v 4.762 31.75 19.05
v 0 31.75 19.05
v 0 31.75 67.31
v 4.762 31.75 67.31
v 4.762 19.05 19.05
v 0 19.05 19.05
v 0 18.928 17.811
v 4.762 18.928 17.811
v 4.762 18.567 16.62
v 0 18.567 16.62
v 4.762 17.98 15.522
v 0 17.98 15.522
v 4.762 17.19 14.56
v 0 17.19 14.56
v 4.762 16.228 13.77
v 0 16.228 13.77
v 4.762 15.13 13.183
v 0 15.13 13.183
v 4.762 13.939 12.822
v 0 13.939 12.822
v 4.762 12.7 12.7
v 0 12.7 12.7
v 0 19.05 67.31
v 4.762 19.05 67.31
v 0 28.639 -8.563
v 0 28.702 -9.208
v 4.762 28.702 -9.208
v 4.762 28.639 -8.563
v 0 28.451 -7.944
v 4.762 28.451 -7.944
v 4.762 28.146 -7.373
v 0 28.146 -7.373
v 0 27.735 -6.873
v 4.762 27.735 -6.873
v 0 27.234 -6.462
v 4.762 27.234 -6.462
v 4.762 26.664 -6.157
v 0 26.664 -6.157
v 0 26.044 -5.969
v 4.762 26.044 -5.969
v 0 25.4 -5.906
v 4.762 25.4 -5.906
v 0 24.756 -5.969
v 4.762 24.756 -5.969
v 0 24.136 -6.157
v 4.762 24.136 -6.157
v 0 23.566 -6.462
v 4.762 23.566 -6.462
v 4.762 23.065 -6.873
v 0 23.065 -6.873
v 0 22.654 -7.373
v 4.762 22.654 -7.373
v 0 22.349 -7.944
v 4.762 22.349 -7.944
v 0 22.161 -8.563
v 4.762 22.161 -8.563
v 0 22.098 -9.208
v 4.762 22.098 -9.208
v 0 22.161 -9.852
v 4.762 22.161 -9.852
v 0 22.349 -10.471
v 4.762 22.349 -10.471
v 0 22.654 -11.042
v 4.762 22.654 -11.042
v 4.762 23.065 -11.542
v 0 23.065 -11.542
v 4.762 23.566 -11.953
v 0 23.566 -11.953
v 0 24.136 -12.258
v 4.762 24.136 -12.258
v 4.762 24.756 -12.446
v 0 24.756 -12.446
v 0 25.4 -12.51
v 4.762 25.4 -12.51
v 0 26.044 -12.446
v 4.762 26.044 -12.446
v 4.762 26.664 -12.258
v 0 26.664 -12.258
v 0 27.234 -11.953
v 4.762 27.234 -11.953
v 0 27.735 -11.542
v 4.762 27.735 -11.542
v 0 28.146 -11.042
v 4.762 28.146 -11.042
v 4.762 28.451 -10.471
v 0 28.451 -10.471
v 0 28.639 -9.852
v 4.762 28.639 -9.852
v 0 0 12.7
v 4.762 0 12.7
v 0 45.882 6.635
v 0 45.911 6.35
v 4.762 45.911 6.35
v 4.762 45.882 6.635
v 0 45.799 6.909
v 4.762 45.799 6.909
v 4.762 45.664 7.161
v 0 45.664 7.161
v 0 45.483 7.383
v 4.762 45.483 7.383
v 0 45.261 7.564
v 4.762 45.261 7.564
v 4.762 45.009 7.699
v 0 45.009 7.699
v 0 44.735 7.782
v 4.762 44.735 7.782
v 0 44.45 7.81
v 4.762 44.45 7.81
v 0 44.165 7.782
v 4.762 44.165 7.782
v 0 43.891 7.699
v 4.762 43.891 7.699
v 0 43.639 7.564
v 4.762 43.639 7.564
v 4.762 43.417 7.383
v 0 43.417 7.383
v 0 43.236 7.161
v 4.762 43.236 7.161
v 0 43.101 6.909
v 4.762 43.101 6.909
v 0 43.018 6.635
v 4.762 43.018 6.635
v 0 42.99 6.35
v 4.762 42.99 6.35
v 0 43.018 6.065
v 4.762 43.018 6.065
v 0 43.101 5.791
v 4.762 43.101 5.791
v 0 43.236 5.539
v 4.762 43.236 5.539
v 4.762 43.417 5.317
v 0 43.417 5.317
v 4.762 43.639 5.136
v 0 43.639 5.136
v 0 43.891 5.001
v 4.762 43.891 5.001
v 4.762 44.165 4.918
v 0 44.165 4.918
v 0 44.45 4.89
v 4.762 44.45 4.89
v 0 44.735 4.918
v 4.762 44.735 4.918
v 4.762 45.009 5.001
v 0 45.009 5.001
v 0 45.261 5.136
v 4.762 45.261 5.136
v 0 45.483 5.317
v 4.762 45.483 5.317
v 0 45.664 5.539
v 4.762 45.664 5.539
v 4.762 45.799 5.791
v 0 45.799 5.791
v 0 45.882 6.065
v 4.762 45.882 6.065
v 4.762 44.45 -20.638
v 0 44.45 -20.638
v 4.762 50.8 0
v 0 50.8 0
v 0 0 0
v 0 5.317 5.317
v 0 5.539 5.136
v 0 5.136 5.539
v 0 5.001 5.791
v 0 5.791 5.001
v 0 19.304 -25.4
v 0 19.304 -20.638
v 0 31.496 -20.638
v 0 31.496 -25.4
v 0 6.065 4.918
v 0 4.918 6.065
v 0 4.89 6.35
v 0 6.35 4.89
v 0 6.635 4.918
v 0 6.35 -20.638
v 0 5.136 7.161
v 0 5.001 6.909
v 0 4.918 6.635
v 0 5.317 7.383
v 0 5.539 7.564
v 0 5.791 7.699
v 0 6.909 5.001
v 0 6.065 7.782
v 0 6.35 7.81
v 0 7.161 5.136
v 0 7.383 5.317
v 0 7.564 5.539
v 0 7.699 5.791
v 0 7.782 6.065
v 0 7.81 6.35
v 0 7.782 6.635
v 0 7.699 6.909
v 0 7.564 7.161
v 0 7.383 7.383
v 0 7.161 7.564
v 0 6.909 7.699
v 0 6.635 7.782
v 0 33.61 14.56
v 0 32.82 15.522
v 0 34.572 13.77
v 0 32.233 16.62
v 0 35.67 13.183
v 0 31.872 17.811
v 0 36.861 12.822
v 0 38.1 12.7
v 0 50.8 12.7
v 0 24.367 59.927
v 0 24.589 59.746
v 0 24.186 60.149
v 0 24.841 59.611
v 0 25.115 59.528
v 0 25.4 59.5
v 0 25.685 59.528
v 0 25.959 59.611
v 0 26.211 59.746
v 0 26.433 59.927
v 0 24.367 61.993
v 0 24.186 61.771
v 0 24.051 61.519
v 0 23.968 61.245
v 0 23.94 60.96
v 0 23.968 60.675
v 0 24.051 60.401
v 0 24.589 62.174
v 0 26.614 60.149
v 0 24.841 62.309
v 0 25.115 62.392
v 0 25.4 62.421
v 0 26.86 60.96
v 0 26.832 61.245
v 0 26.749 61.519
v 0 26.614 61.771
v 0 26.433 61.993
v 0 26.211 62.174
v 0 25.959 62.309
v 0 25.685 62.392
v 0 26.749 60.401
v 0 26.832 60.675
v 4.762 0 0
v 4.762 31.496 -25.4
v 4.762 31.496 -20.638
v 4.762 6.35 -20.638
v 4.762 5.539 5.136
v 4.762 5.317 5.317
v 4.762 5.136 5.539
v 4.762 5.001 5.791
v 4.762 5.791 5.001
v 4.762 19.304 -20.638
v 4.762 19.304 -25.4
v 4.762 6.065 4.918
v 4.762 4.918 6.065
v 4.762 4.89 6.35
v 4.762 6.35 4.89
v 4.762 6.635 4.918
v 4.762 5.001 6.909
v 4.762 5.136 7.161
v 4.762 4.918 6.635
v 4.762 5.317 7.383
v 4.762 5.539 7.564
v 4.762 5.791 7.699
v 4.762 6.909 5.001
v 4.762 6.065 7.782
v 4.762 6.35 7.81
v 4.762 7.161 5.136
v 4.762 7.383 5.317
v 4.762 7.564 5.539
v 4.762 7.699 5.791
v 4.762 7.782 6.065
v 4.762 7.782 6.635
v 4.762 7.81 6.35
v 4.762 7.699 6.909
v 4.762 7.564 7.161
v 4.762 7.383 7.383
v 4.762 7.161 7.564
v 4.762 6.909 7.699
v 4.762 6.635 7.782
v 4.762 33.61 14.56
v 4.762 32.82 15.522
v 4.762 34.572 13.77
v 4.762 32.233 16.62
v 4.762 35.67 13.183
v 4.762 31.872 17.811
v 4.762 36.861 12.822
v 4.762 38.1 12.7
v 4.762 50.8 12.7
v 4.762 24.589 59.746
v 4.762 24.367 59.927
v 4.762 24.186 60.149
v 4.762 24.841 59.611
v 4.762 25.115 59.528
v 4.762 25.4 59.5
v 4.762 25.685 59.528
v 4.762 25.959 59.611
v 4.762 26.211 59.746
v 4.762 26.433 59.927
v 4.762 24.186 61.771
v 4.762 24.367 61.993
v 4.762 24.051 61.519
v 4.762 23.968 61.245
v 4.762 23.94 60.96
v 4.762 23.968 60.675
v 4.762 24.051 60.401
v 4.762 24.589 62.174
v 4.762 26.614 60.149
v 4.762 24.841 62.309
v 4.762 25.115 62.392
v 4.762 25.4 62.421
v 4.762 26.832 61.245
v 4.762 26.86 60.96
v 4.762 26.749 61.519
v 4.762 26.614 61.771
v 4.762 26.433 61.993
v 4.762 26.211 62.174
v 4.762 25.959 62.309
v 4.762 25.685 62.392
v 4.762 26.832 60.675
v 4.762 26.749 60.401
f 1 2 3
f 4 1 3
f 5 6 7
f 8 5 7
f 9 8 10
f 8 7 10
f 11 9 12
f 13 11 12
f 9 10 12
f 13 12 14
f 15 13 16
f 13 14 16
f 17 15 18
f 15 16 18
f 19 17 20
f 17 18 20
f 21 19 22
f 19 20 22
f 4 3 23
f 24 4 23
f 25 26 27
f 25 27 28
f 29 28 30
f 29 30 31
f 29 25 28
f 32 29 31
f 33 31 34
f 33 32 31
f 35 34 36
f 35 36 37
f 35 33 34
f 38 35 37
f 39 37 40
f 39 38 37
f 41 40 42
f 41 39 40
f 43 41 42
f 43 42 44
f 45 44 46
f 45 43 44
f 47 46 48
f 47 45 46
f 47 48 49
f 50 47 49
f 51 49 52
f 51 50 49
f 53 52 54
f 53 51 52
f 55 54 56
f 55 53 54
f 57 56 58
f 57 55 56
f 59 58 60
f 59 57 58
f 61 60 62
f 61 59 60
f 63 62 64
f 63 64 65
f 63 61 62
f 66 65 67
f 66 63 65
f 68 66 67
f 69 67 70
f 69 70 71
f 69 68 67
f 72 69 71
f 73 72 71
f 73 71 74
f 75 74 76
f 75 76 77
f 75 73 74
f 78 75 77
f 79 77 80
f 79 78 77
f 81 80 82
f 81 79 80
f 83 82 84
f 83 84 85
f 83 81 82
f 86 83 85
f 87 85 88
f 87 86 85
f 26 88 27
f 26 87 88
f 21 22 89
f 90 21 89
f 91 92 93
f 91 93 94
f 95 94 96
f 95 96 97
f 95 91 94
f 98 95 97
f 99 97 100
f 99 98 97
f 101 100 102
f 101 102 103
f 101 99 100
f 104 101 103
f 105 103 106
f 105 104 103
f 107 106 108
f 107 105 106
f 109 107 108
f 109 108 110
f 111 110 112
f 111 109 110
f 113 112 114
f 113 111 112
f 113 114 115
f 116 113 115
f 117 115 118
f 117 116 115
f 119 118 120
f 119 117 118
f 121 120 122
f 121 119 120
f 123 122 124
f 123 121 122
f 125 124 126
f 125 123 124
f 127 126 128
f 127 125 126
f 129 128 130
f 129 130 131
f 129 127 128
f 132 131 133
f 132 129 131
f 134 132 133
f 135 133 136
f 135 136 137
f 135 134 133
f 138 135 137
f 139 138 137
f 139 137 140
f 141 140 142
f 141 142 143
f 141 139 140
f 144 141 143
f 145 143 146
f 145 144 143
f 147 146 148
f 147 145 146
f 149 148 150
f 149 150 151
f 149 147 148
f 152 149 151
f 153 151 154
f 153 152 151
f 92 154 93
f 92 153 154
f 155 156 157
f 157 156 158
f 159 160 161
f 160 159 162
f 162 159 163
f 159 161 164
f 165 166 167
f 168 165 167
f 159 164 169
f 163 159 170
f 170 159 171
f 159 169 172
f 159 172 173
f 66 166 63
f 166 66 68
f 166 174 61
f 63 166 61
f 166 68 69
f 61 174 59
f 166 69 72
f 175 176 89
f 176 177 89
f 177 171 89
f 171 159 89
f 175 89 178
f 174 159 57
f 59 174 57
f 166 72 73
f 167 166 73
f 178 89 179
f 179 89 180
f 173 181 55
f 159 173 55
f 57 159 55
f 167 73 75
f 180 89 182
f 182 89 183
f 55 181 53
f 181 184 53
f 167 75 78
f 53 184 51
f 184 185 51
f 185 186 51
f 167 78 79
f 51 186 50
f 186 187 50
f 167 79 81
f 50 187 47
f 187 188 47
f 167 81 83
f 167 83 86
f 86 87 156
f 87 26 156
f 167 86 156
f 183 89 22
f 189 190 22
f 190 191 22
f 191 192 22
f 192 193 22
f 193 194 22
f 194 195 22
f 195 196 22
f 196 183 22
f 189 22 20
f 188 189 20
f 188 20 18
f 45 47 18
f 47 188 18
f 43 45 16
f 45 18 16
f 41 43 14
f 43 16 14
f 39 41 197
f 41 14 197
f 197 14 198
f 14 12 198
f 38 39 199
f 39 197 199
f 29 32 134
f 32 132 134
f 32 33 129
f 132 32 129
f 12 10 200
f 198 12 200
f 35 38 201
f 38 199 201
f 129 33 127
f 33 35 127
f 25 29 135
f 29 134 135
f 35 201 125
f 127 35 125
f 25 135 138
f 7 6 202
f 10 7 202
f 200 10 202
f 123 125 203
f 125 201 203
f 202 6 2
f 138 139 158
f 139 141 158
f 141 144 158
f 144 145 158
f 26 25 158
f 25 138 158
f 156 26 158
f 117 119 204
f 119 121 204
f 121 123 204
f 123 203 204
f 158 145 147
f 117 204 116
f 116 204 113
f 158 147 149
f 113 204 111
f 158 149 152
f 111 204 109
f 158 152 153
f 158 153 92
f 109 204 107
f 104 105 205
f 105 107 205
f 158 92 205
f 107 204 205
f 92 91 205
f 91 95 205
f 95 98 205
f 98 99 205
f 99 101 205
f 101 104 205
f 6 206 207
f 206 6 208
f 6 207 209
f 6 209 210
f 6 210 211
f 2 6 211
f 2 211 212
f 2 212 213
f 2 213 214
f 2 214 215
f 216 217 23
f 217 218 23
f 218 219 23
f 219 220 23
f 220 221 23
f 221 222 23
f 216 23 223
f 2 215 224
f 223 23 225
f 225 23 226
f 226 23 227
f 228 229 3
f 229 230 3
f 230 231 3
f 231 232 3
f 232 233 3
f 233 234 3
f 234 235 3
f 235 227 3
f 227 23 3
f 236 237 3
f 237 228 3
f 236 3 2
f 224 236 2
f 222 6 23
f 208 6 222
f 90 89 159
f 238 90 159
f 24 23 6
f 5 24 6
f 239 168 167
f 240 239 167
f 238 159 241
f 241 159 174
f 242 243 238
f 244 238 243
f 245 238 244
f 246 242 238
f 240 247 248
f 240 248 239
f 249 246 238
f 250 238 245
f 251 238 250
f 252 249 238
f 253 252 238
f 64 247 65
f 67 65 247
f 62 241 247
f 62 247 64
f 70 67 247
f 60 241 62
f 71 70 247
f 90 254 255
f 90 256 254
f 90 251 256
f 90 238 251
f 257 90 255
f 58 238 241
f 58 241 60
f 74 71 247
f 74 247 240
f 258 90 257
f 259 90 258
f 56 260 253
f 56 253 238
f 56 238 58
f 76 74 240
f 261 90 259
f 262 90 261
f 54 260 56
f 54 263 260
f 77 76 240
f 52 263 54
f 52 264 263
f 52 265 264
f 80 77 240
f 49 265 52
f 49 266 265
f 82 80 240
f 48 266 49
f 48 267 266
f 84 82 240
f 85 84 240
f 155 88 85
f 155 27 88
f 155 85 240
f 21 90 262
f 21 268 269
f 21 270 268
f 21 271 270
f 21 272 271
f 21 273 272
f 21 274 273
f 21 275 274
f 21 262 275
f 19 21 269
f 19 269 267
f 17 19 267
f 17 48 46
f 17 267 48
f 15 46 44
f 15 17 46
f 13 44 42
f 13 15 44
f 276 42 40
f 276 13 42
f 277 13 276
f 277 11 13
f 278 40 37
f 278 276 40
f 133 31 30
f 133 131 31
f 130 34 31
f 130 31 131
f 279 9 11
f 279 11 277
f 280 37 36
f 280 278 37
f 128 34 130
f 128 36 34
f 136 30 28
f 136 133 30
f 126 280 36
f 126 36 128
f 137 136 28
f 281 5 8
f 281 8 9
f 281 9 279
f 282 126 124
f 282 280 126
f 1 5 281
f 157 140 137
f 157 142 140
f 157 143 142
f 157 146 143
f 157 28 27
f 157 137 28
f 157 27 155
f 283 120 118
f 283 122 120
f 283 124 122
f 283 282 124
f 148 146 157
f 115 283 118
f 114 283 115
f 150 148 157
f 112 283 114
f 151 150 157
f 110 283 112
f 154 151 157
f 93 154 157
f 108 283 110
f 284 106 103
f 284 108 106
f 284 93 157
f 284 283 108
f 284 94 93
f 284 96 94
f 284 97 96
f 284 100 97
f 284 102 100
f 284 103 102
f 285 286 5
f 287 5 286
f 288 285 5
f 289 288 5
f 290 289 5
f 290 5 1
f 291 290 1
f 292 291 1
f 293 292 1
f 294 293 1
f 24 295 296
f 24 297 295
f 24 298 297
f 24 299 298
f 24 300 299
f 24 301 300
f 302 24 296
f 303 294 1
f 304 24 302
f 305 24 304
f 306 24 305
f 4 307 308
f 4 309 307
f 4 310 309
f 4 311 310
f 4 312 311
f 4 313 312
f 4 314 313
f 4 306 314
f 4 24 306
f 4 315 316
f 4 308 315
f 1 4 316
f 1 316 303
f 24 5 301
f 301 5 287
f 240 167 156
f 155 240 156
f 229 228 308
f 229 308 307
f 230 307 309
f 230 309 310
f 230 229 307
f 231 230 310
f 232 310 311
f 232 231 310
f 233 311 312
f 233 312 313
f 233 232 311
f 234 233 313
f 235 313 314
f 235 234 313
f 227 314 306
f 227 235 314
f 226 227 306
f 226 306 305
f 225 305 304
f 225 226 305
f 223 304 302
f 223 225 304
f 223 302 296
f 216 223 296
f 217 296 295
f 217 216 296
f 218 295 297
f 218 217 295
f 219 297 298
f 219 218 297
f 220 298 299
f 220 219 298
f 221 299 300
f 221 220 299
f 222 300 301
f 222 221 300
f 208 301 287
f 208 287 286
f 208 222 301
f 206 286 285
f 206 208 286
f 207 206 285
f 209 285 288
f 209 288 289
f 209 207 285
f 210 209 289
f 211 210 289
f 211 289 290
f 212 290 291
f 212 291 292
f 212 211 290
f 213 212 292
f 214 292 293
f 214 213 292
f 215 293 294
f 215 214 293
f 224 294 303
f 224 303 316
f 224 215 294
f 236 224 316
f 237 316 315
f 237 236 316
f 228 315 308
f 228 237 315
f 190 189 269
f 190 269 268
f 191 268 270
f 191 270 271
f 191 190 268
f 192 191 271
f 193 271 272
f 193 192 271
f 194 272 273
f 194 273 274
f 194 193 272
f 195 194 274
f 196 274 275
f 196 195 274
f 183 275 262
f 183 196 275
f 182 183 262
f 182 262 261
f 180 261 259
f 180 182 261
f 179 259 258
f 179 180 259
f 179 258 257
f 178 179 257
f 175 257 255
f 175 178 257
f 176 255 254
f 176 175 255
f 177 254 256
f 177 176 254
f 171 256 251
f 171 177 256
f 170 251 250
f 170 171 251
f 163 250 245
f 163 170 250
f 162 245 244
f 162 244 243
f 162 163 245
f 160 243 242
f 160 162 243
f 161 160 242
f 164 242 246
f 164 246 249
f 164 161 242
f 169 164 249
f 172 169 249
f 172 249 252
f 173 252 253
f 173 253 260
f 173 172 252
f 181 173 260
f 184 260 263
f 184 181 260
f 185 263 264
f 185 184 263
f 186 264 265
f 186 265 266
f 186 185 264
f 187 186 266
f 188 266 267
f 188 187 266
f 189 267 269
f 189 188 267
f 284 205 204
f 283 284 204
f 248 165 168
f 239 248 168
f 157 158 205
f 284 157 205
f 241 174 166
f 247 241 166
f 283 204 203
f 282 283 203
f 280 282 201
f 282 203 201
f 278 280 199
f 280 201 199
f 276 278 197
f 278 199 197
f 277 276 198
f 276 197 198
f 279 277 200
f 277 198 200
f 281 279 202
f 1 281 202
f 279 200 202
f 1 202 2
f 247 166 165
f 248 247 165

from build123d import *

# Parameters (mm, degrees)
F0_R     = 3.302
F0_R_2   = 1.4605
F1_DEPTH = 4.7625


with BuildPart() as f1:
    # F0 (on Right) → F1 (new body)
    with BuildSketch(Plane.YZ):
        with BuildLine():
            Line((12.7, 12.7), (0, 12.7))
            Line((0, 12.7), (0, 0))
            Line((0, 0), (6.35, -20.6375))
            Line((6.35, -20.6375), (19.304, -20.6375))
            Line((19.304, -20.6375), (19.304, -25.4))
            Line((19.304, -25.4), (31.496, -25.4))
            Line((31.496, -25.4), (31.496, -20.6375))
            Line((31.496, -20.6375), (44.45, -20.6375))
            Line((44.45, -20.6375), (50.8, 0))
            Line((50.8, 0), (50.8, 12.7))
            Line((50.8, 12.7), (38.1, 12.7))
            ThreePointArc((38.1, 12.7), (33.609872, 14.559872), (31.75, 19.05))
            Line((31.75, 19.05), (31.75, 67.31))
            Line((31.75, 67.31), (19.05, 67.31))
            Line((19.05, 67.31), (19.05, 19.05))
            ThreePointArc((19.05, 19.05), (17.190128, 14.559872), (12.7, 12.7))
        make_face()
        with Locations((25.4, -9.2075)):
            Circle(F0_R, mode=Mode.SUBTRACT)
        with Locations((6.35, 6.35)):
            Circle(F0_R_2, mode=Mode.SUBTRACT)
        with Locations((44.45, 6.35)):
            Circle(F0_R_2, mode=Mode.SUBTRACT)
        with Locations((25.4, 60.96)):
            Circle(F0_R_2, mode=Mode.SUBTRACT)
    extrude(amount=F1_DEPTH)


solid = f1.part
